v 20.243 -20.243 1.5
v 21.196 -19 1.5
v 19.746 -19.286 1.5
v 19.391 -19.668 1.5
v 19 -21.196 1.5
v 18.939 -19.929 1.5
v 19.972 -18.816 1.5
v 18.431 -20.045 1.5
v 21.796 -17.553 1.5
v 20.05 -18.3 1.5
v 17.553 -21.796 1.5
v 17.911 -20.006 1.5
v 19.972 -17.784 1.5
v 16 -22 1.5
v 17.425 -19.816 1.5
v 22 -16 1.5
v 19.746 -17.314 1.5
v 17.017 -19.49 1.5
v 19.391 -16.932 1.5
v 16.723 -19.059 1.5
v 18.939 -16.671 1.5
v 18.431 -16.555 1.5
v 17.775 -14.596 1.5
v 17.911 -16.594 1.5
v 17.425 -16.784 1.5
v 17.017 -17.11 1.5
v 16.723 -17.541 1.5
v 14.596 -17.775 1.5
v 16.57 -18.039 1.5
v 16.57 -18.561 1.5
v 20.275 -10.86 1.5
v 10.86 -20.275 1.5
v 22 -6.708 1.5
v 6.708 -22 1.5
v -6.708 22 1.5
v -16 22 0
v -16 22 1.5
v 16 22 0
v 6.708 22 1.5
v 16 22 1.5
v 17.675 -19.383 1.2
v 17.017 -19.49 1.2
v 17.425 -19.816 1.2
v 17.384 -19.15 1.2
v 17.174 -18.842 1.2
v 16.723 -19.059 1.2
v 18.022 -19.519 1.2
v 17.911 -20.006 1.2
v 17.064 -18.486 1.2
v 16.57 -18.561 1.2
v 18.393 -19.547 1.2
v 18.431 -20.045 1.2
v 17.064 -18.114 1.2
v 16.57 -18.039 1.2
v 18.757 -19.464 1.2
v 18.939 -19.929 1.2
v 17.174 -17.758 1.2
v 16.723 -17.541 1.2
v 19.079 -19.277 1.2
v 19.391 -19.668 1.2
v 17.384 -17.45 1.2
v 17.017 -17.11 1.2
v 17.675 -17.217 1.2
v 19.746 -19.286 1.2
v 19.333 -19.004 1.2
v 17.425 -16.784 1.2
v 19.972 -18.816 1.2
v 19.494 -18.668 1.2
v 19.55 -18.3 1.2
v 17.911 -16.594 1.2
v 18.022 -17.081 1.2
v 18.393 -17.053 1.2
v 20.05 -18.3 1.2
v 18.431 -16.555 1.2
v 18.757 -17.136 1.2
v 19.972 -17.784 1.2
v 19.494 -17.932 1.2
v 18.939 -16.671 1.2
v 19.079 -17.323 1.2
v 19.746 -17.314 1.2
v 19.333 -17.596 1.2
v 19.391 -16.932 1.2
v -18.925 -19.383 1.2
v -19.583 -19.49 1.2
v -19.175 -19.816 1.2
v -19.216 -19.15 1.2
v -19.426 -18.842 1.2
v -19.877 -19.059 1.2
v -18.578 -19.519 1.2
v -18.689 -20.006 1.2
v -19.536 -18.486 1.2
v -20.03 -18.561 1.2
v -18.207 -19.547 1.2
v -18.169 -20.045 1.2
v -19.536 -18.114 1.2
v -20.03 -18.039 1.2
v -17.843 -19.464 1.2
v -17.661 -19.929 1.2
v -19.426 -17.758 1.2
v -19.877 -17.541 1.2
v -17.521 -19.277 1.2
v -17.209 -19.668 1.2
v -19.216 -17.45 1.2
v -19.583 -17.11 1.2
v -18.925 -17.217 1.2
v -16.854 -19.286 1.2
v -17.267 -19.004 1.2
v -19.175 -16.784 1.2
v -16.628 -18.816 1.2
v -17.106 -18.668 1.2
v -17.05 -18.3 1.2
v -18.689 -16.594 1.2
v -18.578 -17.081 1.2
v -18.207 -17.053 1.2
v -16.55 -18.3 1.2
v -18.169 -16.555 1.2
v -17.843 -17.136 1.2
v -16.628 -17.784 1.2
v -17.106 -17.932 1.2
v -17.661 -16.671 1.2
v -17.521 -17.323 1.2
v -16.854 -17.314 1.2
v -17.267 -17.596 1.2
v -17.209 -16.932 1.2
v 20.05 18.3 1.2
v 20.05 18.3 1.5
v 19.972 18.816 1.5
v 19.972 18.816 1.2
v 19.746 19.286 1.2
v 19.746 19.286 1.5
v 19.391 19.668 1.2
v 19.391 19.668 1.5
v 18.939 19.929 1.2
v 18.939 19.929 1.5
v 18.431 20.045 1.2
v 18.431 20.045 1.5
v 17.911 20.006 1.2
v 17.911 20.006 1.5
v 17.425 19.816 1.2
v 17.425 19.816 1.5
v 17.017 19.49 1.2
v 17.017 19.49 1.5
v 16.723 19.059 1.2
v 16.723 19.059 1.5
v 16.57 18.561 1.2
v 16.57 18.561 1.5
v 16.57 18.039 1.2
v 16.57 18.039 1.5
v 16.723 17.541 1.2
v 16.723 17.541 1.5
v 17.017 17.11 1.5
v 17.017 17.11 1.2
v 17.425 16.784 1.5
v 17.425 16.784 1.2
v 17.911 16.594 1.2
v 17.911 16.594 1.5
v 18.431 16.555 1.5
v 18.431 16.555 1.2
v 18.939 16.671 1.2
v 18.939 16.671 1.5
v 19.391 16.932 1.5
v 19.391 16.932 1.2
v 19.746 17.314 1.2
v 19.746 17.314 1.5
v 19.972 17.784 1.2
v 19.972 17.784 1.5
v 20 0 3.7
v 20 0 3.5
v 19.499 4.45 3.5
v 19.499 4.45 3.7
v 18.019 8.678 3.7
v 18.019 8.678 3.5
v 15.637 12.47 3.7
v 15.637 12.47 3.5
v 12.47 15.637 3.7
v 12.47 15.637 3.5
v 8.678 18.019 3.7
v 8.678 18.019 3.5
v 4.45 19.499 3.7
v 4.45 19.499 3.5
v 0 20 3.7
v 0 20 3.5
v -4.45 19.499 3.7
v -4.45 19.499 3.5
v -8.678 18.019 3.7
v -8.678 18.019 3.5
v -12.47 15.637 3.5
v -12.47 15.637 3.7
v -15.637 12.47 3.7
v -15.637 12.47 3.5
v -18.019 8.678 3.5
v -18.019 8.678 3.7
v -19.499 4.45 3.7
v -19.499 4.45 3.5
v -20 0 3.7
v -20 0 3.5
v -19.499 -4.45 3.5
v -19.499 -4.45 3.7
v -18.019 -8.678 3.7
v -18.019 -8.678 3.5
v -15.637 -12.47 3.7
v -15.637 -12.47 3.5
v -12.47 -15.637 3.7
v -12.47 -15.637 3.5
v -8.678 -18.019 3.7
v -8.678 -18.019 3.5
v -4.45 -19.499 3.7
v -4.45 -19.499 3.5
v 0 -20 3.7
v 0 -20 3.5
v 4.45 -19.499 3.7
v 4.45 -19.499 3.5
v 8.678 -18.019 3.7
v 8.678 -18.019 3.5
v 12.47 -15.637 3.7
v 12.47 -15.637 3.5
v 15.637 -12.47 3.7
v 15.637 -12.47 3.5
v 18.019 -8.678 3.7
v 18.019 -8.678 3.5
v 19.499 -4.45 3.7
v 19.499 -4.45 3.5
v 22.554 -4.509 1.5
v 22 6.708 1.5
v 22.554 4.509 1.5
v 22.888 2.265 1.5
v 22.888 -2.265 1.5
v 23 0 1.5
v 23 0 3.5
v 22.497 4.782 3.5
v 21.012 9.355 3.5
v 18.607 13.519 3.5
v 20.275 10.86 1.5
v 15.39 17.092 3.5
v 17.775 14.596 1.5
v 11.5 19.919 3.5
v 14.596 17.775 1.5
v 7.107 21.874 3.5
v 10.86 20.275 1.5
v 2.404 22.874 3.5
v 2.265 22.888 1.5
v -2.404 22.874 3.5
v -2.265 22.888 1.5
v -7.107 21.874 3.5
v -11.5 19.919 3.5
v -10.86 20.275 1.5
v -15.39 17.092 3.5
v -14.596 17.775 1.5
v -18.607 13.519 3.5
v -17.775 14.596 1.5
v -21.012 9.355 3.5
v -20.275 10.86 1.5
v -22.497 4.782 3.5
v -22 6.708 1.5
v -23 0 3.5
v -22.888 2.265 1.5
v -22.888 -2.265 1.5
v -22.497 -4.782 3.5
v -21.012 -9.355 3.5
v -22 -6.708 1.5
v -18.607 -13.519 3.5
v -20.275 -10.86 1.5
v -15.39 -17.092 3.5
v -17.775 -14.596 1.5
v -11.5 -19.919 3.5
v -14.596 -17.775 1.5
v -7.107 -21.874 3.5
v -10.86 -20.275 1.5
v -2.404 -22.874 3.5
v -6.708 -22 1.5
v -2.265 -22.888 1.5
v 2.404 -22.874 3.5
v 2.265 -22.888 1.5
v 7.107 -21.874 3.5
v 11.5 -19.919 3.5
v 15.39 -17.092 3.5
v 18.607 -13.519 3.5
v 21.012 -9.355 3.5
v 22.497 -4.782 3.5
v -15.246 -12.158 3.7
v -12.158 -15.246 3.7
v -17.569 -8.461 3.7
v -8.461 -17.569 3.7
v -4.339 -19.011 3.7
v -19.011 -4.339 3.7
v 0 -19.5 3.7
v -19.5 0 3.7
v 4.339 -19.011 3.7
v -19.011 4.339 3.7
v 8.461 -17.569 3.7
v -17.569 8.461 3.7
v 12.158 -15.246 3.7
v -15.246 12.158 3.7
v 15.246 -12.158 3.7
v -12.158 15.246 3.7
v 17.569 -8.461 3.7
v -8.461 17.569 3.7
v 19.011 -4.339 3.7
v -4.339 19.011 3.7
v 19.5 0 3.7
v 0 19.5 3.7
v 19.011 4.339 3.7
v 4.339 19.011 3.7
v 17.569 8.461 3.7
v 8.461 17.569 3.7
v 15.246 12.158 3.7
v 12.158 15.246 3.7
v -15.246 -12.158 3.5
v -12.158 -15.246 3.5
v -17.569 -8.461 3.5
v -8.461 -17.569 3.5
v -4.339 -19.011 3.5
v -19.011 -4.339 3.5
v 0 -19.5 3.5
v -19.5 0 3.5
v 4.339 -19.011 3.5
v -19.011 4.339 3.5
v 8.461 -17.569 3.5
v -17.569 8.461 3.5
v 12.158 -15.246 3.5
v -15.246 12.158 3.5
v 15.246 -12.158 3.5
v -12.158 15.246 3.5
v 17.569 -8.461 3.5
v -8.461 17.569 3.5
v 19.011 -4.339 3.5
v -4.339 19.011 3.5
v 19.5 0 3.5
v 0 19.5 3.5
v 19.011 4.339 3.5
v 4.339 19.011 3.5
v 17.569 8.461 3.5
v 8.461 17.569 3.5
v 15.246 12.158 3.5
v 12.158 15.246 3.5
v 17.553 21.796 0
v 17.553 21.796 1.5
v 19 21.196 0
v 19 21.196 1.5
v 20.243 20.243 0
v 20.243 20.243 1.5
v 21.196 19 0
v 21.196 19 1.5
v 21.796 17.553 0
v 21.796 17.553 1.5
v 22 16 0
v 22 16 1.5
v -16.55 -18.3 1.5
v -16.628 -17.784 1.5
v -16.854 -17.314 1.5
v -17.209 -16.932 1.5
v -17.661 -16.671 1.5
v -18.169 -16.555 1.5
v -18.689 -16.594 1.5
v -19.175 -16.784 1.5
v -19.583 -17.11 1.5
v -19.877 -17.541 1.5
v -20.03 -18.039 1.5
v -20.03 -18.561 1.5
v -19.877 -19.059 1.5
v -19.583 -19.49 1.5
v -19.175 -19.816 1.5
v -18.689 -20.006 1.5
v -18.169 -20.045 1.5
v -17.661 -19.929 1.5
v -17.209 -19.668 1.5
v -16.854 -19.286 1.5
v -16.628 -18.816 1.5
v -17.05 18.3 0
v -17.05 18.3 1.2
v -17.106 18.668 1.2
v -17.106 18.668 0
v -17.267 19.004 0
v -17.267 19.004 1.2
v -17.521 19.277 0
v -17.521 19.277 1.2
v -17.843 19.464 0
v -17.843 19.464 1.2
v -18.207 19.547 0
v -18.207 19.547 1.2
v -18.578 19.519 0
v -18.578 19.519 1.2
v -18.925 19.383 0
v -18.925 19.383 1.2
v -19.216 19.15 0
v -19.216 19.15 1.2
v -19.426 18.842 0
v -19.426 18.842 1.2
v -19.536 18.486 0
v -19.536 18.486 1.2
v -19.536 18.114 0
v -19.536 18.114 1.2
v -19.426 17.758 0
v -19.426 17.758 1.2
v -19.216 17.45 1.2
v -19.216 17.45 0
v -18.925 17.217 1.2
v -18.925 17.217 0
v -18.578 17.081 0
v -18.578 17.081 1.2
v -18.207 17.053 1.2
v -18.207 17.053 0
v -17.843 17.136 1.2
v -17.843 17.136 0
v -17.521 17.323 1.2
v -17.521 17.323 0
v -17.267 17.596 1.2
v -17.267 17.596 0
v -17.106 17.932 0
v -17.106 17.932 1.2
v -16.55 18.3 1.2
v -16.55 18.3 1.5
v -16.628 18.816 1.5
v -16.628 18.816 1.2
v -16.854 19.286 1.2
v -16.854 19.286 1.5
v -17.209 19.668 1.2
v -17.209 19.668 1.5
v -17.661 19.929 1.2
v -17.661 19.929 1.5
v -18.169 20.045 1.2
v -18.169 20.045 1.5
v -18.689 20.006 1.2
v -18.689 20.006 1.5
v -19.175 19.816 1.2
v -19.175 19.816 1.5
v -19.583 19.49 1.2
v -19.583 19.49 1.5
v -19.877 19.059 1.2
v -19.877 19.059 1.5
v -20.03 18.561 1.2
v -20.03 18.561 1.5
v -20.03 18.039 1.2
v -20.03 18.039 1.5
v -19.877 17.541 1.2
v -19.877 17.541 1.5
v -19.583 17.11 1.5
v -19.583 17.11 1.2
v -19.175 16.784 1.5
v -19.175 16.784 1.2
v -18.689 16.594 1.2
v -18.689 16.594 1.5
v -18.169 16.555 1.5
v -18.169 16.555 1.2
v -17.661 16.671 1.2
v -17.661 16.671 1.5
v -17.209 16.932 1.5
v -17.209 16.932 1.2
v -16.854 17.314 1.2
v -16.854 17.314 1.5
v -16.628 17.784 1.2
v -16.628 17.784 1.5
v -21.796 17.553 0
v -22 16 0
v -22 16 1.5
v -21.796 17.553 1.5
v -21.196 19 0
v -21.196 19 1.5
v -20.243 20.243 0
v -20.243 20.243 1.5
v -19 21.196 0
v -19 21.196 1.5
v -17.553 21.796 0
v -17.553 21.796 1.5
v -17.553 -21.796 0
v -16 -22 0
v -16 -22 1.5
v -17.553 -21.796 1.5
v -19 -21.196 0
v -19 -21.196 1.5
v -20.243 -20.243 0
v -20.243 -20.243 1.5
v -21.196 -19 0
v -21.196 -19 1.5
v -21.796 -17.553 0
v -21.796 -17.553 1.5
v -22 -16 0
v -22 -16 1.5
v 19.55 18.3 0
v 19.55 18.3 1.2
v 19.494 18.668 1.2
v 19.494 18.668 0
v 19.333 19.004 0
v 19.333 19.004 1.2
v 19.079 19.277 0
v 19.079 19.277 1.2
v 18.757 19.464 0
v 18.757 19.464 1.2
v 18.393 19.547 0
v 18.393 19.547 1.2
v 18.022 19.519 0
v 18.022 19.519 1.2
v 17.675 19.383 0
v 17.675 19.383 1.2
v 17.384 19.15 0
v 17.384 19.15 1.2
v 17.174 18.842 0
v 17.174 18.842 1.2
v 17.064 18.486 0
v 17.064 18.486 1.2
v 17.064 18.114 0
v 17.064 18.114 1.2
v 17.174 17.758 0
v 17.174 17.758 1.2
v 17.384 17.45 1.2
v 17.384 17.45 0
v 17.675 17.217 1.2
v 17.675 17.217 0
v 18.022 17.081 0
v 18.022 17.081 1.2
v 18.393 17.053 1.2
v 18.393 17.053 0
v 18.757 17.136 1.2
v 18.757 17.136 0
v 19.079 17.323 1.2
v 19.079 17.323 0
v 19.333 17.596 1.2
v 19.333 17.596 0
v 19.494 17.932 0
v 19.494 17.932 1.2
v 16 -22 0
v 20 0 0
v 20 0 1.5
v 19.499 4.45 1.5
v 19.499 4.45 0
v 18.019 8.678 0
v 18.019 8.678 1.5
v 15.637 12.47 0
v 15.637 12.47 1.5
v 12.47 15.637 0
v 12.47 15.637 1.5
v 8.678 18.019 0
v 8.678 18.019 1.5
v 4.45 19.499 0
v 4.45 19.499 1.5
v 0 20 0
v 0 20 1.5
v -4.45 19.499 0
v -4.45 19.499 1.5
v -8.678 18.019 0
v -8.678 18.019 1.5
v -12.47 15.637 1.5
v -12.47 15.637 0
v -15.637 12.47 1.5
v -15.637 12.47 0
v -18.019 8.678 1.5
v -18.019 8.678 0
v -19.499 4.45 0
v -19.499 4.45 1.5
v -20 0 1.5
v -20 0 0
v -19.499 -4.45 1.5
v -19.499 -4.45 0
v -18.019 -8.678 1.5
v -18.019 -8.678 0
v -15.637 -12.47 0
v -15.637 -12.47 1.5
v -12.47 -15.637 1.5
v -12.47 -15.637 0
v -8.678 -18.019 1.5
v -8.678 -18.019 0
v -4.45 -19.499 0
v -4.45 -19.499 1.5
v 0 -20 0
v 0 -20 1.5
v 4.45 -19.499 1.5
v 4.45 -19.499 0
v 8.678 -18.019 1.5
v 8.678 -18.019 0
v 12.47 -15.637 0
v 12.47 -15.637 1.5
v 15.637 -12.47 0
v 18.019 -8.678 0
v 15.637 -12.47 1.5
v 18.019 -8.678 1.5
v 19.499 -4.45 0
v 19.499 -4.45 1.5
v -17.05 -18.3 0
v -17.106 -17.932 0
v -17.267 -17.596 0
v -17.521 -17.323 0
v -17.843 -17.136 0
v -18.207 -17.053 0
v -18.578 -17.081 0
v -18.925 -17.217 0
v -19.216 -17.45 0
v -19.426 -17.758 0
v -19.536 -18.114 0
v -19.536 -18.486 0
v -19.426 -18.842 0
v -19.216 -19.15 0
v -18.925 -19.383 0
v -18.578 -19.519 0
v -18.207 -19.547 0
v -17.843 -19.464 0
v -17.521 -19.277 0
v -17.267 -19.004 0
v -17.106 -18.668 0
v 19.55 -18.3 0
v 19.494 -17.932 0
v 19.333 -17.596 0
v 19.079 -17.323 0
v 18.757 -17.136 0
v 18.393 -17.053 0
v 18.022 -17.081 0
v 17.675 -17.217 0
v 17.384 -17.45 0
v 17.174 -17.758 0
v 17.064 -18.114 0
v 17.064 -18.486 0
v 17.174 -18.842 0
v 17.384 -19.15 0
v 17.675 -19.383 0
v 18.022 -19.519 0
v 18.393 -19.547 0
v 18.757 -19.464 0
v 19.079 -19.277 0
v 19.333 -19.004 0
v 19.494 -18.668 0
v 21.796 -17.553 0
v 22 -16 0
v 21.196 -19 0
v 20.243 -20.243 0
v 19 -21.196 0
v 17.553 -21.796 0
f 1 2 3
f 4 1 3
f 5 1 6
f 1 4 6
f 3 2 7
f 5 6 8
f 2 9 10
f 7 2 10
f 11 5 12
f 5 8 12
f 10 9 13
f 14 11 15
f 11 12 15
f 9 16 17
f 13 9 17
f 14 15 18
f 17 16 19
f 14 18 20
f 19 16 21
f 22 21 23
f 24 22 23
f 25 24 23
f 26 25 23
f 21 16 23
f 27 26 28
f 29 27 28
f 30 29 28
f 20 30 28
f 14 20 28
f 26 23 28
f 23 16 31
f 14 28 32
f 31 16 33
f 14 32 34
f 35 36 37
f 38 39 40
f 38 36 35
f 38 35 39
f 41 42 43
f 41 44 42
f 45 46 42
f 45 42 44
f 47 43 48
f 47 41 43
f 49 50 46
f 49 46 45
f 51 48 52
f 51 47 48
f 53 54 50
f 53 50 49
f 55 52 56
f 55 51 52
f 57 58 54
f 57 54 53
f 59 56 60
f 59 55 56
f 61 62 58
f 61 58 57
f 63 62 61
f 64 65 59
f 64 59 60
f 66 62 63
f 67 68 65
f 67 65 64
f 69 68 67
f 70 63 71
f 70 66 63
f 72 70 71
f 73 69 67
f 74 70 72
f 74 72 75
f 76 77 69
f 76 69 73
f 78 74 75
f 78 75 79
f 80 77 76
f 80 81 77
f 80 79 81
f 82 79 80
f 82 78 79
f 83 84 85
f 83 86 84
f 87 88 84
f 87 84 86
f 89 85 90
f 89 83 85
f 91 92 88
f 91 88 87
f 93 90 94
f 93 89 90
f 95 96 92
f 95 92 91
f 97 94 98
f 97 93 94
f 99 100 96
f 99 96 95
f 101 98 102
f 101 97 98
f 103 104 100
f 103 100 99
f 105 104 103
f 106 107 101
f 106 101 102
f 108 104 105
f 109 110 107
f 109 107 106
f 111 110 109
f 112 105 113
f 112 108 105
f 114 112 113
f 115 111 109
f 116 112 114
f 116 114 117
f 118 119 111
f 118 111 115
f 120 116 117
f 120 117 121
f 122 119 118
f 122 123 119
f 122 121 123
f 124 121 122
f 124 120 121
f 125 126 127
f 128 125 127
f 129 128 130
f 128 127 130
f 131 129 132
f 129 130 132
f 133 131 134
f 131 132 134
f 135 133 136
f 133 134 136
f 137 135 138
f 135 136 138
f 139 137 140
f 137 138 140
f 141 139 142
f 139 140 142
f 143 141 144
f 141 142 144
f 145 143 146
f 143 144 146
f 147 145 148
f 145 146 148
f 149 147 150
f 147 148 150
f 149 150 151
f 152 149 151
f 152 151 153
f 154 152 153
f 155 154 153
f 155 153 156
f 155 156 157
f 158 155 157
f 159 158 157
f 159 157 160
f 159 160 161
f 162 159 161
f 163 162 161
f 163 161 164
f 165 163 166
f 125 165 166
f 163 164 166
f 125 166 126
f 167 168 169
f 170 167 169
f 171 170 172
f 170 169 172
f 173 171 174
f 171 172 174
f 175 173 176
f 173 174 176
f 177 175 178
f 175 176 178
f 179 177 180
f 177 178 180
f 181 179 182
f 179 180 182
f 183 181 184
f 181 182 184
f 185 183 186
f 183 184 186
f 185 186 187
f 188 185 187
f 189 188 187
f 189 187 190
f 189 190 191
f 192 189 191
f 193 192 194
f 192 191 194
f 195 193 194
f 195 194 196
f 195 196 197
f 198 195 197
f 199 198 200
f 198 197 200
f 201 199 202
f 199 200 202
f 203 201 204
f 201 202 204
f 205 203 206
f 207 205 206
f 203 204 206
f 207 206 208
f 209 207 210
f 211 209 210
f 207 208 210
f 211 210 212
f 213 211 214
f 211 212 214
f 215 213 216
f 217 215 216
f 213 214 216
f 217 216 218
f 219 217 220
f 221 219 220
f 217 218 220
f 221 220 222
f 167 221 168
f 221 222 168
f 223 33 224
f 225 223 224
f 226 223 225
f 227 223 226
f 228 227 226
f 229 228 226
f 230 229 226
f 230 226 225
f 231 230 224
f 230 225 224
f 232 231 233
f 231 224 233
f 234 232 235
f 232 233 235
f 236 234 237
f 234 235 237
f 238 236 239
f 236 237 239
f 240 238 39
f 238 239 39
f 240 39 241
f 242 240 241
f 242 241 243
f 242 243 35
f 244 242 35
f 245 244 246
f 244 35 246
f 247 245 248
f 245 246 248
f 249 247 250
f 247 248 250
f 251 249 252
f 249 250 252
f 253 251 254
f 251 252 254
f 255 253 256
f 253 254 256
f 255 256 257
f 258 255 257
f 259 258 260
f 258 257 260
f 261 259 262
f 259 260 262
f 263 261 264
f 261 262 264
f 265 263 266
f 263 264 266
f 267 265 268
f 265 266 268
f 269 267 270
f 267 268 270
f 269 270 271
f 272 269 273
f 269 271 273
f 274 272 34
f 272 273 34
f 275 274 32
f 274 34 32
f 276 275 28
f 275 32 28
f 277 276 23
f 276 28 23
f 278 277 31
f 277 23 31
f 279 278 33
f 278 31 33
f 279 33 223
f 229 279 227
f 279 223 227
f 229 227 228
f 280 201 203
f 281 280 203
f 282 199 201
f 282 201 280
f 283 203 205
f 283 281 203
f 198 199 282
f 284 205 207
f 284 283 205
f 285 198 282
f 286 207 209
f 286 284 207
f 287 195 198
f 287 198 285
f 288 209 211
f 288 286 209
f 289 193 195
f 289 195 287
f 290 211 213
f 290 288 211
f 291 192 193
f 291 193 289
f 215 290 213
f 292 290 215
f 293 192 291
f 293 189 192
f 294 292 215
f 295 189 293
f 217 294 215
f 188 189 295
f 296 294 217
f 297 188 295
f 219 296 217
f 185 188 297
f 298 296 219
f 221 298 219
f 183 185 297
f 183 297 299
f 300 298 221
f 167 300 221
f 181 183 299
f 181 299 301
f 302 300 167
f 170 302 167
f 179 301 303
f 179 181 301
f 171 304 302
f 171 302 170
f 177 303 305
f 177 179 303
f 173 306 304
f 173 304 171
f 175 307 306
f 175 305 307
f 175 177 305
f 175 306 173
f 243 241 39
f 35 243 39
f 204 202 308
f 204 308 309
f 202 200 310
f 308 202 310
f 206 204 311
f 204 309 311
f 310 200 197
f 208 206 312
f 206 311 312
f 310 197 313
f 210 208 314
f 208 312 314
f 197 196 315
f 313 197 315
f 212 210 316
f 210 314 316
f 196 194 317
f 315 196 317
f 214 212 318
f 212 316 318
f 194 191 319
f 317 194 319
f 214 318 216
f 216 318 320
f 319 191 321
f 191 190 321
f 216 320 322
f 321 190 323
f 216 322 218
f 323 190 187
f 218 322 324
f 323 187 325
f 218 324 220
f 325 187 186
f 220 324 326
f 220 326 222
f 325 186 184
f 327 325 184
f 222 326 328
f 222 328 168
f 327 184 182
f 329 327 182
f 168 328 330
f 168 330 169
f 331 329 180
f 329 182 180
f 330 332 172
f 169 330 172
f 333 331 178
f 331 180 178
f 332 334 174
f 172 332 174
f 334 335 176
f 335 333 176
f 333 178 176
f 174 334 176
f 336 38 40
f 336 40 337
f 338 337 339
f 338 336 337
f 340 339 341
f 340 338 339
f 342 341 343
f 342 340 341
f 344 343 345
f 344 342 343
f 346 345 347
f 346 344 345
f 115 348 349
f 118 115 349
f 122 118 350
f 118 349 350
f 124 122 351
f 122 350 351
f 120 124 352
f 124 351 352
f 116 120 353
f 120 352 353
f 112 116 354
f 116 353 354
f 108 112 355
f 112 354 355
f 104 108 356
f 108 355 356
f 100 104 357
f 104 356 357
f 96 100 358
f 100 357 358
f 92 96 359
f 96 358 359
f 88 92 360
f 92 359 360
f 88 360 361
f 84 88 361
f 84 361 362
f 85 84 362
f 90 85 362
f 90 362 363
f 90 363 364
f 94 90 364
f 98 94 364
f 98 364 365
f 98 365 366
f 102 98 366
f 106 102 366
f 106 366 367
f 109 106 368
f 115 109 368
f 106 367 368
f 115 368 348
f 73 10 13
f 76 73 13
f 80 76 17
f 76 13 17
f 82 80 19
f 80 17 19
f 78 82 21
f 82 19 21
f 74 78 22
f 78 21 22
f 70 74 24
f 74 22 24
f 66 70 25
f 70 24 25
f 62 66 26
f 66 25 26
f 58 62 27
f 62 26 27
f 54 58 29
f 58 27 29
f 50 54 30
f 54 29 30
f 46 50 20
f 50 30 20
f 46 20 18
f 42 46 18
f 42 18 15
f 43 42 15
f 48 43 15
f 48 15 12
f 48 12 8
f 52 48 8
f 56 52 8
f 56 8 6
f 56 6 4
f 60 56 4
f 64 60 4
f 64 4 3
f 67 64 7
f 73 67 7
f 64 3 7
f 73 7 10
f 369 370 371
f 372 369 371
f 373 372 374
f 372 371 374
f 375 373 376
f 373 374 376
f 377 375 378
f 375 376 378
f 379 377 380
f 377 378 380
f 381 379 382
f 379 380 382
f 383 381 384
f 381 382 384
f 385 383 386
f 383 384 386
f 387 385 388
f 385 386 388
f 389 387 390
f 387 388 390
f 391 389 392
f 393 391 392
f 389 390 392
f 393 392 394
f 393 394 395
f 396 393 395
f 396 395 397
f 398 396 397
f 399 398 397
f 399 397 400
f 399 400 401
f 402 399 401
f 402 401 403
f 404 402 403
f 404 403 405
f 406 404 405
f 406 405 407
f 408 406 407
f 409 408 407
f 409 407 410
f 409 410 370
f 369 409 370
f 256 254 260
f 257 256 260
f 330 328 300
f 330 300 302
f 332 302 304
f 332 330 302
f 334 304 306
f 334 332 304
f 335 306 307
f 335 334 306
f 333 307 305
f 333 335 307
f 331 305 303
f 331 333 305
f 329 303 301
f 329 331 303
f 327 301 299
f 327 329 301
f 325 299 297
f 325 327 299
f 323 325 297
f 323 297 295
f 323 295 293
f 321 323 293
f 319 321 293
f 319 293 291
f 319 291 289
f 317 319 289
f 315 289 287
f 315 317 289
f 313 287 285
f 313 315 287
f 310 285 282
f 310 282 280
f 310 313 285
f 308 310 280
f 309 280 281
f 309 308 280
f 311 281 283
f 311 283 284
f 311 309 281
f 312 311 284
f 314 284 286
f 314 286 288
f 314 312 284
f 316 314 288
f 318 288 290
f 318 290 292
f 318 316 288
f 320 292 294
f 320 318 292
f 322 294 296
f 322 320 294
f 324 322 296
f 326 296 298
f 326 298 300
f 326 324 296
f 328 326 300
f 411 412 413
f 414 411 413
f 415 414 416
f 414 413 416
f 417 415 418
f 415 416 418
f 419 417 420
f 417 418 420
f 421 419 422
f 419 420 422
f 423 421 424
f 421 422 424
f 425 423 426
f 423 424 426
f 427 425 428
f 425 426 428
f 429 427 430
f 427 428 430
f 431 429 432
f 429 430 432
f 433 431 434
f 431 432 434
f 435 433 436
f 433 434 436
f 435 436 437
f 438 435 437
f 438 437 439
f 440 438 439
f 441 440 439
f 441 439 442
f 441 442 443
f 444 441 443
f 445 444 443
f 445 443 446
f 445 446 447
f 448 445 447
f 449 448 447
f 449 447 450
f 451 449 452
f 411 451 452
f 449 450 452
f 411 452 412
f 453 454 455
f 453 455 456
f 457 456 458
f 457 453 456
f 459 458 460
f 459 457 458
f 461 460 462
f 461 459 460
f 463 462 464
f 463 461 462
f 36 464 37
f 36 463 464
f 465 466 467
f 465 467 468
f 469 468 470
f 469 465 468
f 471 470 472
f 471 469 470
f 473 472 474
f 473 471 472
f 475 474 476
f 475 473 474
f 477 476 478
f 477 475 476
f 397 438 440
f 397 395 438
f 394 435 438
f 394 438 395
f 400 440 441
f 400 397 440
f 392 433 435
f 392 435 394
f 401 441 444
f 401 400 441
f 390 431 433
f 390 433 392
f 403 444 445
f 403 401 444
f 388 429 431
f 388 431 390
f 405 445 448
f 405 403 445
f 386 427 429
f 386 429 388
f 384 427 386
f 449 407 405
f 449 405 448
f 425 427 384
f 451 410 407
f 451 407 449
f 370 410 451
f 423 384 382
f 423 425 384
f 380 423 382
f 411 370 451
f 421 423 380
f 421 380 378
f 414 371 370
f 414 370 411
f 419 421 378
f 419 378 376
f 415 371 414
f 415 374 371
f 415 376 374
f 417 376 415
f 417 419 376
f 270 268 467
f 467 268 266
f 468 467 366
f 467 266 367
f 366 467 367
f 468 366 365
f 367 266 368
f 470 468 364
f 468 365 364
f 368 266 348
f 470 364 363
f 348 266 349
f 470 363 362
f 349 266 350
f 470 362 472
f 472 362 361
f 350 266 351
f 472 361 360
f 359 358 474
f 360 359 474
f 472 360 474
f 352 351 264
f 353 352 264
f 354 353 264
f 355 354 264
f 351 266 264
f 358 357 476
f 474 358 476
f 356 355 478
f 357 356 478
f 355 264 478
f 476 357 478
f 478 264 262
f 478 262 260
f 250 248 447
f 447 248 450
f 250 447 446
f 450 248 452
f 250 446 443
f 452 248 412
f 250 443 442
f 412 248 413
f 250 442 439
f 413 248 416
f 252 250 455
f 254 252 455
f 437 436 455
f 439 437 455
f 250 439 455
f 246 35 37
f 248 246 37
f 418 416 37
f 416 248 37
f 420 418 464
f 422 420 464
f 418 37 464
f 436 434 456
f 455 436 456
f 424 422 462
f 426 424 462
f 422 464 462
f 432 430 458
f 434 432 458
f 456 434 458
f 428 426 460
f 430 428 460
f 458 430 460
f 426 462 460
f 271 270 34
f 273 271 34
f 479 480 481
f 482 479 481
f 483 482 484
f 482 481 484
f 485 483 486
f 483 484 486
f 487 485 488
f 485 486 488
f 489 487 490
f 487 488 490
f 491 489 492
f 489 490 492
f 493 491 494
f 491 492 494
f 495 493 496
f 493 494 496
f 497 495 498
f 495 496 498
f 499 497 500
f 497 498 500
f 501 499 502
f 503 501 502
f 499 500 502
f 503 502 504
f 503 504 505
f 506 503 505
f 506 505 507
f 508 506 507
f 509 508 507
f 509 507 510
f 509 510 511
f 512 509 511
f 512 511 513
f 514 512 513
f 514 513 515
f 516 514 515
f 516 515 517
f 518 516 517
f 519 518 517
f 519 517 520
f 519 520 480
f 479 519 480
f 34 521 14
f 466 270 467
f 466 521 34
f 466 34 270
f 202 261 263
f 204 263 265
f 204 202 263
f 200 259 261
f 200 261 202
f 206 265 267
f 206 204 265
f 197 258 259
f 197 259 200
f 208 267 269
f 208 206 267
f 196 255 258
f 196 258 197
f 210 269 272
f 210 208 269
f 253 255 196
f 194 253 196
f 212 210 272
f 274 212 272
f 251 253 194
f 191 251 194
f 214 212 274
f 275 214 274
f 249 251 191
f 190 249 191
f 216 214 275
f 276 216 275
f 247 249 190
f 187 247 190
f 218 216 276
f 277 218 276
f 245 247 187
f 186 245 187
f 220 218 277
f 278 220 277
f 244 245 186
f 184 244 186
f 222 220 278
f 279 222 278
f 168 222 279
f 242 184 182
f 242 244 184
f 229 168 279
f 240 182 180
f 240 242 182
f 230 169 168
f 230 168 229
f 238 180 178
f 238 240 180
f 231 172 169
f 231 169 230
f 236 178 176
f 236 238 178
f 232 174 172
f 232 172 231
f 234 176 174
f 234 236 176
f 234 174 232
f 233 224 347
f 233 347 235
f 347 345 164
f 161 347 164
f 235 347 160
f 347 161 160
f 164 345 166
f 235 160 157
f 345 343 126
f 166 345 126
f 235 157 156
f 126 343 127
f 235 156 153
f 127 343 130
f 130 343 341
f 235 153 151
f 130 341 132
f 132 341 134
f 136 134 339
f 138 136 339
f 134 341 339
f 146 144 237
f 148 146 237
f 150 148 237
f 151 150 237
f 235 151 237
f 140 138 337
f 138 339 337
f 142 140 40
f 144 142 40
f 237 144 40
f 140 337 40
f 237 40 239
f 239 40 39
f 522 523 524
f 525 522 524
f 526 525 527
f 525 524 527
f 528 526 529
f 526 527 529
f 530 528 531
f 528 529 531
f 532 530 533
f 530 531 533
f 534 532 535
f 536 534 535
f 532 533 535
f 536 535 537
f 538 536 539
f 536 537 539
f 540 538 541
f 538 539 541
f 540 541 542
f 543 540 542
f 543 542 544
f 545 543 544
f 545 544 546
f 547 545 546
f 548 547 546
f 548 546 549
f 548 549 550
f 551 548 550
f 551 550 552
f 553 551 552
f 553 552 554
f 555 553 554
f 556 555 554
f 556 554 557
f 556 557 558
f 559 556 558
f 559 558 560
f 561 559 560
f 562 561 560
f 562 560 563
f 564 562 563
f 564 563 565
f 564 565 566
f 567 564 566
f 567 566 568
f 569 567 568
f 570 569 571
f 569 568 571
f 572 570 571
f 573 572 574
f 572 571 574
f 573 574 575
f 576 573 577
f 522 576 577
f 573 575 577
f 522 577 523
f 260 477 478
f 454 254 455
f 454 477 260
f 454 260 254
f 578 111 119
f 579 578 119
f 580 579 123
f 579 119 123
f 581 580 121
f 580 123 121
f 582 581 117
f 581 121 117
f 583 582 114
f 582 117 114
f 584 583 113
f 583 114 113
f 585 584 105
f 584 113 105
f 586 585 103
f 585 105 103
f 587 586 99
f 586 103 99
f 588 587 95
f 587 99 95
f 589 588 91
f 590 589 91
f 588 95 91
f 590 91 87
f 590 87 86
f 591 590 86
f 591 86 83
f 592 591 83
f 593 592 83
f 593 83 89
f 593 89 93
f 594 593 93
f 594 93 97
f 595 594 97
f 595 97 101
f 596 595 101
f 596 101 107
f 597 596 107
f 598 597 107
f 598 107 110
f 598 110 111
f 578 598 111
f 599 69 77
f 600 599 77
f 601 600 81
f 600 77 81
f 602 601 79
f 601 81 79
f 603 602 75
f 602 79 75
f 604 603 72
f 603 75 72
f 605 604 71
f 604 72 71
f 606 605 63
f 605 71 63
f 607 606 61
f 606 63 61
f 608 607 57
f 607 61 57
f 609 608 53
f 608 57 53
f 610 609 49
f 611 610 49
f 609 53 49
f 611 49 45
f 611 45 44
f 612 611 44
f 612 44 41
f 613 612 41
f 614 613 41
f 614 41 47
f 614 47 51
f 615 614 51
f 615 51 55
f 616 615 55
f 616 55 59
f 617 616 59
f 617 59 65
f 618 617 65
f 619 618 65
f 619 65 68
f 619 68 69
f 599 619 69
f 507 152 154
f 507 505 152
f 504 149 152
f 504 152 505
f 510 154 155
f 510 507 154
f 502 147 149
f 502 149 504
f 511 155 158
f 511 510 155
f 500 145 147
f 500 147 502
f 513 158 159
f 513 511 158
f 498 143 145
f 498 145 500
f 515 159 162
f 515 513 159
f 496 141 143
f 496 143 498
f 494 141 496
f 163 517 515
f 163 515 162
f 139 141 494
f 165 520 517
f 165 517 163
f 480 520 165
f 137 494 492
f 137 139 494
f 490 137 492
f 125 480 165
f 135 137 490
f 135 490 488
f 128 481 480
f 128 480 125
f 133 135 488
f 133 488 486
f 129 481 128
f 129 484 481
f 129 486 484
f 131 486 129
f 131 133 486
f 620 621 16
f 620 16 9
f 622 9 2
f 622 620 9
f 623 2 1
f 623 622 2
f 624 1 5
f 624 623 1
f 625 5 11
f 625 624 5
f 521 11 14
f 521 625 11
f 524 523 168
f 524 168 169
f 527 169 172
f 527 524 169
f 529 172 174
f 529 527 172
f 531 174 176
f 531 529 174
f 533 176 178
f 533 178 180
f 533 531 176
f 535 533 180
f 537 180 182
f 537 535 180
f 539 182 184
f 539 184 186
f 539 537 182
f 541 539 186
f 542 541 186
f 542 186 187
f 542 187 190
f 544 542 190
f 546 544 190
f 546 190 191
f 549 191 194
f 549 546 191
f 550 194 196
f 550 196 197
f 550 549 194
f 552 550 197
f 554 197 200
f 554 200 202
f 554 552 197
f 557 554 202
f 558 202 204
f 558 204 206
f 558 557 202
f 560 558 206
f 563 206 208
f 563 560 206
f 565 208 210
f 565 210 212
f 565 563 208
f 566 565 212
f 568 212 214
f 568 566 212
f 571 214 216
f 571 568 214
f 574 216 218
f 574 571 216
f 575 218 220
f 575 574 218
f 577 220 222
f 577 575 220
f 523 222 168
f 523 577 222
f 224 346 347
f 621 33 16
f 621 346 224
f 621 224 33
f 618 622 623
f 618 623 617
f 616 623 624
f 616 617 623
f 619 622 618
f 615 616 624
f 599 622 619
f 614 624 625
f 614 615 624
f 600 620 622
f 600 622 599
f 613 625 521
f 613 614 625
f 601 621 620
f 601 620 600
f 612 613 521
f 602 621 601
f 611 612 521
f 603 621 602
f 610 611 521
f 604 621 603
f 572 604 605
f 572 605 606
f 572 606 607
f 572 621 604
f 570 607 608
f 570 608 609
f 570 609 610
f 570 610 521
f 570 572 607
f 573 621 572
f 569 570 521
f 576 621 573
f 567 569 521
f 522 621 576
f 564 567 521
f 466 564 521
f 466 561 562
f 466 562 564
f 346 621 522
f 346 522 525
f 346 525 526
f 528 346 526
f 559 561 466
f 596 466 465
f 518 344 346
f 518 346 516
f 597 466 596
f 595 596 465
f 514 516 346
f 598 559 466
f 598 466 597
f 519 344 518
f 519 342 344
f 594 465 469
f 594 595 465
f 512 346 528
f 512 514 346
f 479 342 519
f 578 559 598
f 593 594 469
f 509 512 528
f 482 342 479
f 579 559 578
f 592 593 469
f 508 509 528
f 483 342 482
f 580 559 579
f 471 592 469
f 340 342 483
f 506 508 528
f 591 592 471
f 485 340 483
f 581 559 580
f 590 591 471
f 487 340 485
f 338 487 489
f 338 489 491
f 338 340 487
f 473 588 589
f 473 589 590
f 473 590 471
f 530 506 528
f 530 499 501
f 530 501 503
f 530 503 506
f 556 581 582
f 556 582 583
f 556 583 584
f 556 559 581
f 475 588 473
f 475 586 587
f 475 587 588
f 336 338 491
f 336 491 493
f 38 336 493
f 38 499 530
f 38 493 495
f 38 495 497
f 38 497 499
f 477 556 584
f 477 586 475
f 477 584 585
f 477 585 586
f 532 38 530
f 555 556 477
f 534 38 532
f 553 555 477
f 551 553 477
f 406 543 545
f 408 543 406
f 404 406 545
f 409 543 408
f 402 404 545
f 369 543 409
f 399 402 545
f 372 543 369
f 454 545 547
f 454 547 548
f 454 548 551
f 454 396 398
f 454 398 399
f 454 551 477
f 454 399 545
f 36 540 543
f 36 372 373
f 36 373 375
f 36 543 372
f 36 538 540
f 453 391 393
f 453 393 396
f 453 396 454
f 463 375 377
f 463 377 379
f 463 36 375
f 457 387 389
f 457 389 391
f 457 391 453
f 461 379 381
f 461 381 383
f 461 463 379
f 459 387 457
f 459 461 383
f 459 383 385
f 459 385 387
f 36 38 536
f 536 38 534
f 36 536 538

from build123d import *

# Parameters (mm, degrees)
SALIENTE_EXTRUIR1_DEPTH = 1.5
CROQUIS2_R              = 20
CORTAR_EXTRUIR1_DEPTH   = 2.5
CROQUIS3_R              = 23
CROQUIS3_R_2            = 20
SALIENTE_EXTRUIR2_DEPTH = 2
CROQUIS4_R              = 1.25
CORTAR_EXTRUIR2_DEPTH   = 2
CROQUIS6_R              = 1.75
CORTAR_EXTRUIR3_DEPTH   = 0.3
CROQUIS7_R              = 20
CROQUIS7_R_2            = 19.5
SALIENTE_EXTRUIR3_DEPTH = 0.2


with BuildPart() as part:
    # Croquis1 → Saliente-Extruir1 (new body)
    with BuildSketch(Plane.XY):
        with BuildLine():
            Line((-16, 22), (16, 22))
            ThreePointArc((16, 22), (20.242640687, 20.242640687), (22, 16))
            Line((22, 16), (22, -16))
            ThreePointArc((22, -16), (20.242640687, -20.242640687), (16, -22))
            Line((16, -22), (-16, -22))
            ThreePointArc((-16, -22), (-20.242640687, -20.242640687), (-22, -16))
            Line((-22, -16), (-22, 16))
            ThreePointArc((-22, 16), (-20.242640687, 20.242640687), (-16, 22))
        make_face()
    extrude(amount=SALIENTE_EXTRUIR1_DEPTH)

    # Croquis2 → Cortar-Extruir1 (cut, through all)
    with BuildSketch(Plane.XY.offset(1.5)):
        Circle(CROQUIS2_R)
    extrude(amount=-CORTAR_EXTRUIR1_DEPTH, mode=Mode.SUBTRACT)

    # Croquis3 → Saliente-Extruir2 (add)
    with BuildSketch(Plane.XY.offset(1.5)):
        Circle(CROQUIS3_R)
        Circle(CROQUIS3_R_2, mode=Mode.SUBTRACT)
    extrude(amount=SALIENTE_EXTRUIR2_DEPTH)

    # Croquis4 → Cortar-Extruir2 (cut)
    with BuildSketch(Plane.XY.offset(1.5)):
        with Locations((18.3, 18.3)):
            Circle(CROQUIS4_R)
        with Locations((-18.3, 18.3)):
            Circle(CROQUIS4_R)
        with Locations((18.3, -18.3)):
            Circle(CROQUIS4_R)
        with Locations((-18.3, -18.3)):
            Circle(CROQUIS4_R)
    extrude(amount=-CORTAR_EXTRUIR2_DEPTH, mode=Mode.SUBTRACT)

    # Croquis6 → Cortar-Extruir3 (cut)
    with BuildSketch(Plane.XY.offset(1.5)):
        with Locations((18.3, 18.3)):
            Circle(CROQUIS6_R)
        with Locations((-18.3, 18.3)):
            Circle(CROQUIS6_R)
        with Locations((-18.3, -18.3)):
            Circle(CROQUIS6_R)
        with Locations((18.3, -18.3)):
            Circle(CROQUIS6_R)
    extrude(amount=-CORTAR_EXTRUIR3_DEPTH, mode=Mode.SUBTRACT)


with BuildPart() as body_2:
    # Croquis7 → Saliente-Extruir3 (new body)
    with BuildSketch(Plane.XY.offset(3.5)):
        Circle(CROQUIS7_R)
        Circle(CROQUIS7_R_2, mode=Mode.SUBTRACT)
    extrude(amount=SALIENTE_EXTRUIR3_DEPTH)


solid = Compound([part.part, body_2.part])
